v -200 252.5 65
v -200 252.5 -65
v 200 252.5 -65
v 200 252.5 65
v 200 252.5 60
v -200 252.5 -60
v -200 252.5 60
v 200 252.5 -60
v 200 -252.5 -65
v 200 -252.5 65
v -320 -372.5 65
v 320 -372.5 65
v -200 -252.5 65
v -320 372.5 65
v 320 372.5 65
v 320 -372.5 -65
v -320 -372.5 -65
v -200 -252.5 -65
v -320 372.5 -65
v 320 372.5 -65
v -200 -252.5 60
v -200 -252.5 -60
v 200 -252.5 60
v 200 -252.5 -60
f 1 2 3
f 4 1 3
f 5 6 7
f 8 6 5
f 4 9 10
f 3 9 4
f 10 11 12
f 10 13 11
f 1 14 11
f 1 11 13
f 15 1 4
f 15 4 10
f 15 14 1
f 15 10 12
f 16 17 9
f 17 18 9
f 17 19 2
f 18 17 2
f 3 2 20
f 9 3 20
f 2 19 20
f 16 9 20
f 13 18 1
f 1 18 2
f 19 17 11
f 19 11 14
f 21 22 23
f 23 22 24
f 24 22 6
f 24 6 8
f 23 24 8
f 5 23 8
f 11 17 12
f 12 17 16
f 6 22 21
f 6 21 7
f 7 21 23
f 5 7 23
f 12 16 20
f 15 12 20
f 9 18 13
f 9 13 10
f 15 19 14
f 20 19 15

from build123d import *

# Parameters (mm, degrees)
RESSALTO_EXTRUS_O1_DEPTH      = 60
RESSALTO_EXTRUS_O1_DEPTH_BACK = 60
ESBO_O1_W                     = 400
ESBO_O1_H                     = 505
RESSALTO_EXTRUS_O2_DEPTH      = 65
RESSALTO_EXTRUS_O2_DEPTH_BACK = 65
ESBO_O2_W                     = 640
ESBO_O2_H                     = 745
ESBO_O2_W_2                   = 400
ESBO_O2_H_2                   = 505


with BuildPart() as part:
    # Esboço1 → Ressalto-extrusão1 (new, two sides: drawn at the far end of the back side and taken through both)
    with BuildSketch(Plane.XY.offset(-RESSALTO_EXTRUS_O1_DEPTH_BACK)):
        Rectangle(ESBO_O1_W, ESBO_O1_H)
    extrude(amount=RESSALTO_EXTRUS_O1_DEPTH + RESSALTO_EXTRUS_O1_DEPTH_BACK)


with BuildPart() as body_2:
    # Esboço2 → Ressalto-extrusão2 (new, two sides: drawn at the far end of the back side and taken through both)
    with BuildSketch(Plane.XY.offset(-RESSALTO_EXTRUS_O2_DEPTH_BACK)):
        Rectangle(ESBO_O2_W, ESBO_O2_H)
        Rectangle(ESBO_O2_W_2, ESBO_O2_H_2, mode=Mode.SUBTRACT)
    extrude(amount=RESSALTO_EXTRUS_O2_DEPTH + RESSALTO_EXTRUS_O2_DEPTH_BACK)


solid = Compound([part.part, body_2.part])
